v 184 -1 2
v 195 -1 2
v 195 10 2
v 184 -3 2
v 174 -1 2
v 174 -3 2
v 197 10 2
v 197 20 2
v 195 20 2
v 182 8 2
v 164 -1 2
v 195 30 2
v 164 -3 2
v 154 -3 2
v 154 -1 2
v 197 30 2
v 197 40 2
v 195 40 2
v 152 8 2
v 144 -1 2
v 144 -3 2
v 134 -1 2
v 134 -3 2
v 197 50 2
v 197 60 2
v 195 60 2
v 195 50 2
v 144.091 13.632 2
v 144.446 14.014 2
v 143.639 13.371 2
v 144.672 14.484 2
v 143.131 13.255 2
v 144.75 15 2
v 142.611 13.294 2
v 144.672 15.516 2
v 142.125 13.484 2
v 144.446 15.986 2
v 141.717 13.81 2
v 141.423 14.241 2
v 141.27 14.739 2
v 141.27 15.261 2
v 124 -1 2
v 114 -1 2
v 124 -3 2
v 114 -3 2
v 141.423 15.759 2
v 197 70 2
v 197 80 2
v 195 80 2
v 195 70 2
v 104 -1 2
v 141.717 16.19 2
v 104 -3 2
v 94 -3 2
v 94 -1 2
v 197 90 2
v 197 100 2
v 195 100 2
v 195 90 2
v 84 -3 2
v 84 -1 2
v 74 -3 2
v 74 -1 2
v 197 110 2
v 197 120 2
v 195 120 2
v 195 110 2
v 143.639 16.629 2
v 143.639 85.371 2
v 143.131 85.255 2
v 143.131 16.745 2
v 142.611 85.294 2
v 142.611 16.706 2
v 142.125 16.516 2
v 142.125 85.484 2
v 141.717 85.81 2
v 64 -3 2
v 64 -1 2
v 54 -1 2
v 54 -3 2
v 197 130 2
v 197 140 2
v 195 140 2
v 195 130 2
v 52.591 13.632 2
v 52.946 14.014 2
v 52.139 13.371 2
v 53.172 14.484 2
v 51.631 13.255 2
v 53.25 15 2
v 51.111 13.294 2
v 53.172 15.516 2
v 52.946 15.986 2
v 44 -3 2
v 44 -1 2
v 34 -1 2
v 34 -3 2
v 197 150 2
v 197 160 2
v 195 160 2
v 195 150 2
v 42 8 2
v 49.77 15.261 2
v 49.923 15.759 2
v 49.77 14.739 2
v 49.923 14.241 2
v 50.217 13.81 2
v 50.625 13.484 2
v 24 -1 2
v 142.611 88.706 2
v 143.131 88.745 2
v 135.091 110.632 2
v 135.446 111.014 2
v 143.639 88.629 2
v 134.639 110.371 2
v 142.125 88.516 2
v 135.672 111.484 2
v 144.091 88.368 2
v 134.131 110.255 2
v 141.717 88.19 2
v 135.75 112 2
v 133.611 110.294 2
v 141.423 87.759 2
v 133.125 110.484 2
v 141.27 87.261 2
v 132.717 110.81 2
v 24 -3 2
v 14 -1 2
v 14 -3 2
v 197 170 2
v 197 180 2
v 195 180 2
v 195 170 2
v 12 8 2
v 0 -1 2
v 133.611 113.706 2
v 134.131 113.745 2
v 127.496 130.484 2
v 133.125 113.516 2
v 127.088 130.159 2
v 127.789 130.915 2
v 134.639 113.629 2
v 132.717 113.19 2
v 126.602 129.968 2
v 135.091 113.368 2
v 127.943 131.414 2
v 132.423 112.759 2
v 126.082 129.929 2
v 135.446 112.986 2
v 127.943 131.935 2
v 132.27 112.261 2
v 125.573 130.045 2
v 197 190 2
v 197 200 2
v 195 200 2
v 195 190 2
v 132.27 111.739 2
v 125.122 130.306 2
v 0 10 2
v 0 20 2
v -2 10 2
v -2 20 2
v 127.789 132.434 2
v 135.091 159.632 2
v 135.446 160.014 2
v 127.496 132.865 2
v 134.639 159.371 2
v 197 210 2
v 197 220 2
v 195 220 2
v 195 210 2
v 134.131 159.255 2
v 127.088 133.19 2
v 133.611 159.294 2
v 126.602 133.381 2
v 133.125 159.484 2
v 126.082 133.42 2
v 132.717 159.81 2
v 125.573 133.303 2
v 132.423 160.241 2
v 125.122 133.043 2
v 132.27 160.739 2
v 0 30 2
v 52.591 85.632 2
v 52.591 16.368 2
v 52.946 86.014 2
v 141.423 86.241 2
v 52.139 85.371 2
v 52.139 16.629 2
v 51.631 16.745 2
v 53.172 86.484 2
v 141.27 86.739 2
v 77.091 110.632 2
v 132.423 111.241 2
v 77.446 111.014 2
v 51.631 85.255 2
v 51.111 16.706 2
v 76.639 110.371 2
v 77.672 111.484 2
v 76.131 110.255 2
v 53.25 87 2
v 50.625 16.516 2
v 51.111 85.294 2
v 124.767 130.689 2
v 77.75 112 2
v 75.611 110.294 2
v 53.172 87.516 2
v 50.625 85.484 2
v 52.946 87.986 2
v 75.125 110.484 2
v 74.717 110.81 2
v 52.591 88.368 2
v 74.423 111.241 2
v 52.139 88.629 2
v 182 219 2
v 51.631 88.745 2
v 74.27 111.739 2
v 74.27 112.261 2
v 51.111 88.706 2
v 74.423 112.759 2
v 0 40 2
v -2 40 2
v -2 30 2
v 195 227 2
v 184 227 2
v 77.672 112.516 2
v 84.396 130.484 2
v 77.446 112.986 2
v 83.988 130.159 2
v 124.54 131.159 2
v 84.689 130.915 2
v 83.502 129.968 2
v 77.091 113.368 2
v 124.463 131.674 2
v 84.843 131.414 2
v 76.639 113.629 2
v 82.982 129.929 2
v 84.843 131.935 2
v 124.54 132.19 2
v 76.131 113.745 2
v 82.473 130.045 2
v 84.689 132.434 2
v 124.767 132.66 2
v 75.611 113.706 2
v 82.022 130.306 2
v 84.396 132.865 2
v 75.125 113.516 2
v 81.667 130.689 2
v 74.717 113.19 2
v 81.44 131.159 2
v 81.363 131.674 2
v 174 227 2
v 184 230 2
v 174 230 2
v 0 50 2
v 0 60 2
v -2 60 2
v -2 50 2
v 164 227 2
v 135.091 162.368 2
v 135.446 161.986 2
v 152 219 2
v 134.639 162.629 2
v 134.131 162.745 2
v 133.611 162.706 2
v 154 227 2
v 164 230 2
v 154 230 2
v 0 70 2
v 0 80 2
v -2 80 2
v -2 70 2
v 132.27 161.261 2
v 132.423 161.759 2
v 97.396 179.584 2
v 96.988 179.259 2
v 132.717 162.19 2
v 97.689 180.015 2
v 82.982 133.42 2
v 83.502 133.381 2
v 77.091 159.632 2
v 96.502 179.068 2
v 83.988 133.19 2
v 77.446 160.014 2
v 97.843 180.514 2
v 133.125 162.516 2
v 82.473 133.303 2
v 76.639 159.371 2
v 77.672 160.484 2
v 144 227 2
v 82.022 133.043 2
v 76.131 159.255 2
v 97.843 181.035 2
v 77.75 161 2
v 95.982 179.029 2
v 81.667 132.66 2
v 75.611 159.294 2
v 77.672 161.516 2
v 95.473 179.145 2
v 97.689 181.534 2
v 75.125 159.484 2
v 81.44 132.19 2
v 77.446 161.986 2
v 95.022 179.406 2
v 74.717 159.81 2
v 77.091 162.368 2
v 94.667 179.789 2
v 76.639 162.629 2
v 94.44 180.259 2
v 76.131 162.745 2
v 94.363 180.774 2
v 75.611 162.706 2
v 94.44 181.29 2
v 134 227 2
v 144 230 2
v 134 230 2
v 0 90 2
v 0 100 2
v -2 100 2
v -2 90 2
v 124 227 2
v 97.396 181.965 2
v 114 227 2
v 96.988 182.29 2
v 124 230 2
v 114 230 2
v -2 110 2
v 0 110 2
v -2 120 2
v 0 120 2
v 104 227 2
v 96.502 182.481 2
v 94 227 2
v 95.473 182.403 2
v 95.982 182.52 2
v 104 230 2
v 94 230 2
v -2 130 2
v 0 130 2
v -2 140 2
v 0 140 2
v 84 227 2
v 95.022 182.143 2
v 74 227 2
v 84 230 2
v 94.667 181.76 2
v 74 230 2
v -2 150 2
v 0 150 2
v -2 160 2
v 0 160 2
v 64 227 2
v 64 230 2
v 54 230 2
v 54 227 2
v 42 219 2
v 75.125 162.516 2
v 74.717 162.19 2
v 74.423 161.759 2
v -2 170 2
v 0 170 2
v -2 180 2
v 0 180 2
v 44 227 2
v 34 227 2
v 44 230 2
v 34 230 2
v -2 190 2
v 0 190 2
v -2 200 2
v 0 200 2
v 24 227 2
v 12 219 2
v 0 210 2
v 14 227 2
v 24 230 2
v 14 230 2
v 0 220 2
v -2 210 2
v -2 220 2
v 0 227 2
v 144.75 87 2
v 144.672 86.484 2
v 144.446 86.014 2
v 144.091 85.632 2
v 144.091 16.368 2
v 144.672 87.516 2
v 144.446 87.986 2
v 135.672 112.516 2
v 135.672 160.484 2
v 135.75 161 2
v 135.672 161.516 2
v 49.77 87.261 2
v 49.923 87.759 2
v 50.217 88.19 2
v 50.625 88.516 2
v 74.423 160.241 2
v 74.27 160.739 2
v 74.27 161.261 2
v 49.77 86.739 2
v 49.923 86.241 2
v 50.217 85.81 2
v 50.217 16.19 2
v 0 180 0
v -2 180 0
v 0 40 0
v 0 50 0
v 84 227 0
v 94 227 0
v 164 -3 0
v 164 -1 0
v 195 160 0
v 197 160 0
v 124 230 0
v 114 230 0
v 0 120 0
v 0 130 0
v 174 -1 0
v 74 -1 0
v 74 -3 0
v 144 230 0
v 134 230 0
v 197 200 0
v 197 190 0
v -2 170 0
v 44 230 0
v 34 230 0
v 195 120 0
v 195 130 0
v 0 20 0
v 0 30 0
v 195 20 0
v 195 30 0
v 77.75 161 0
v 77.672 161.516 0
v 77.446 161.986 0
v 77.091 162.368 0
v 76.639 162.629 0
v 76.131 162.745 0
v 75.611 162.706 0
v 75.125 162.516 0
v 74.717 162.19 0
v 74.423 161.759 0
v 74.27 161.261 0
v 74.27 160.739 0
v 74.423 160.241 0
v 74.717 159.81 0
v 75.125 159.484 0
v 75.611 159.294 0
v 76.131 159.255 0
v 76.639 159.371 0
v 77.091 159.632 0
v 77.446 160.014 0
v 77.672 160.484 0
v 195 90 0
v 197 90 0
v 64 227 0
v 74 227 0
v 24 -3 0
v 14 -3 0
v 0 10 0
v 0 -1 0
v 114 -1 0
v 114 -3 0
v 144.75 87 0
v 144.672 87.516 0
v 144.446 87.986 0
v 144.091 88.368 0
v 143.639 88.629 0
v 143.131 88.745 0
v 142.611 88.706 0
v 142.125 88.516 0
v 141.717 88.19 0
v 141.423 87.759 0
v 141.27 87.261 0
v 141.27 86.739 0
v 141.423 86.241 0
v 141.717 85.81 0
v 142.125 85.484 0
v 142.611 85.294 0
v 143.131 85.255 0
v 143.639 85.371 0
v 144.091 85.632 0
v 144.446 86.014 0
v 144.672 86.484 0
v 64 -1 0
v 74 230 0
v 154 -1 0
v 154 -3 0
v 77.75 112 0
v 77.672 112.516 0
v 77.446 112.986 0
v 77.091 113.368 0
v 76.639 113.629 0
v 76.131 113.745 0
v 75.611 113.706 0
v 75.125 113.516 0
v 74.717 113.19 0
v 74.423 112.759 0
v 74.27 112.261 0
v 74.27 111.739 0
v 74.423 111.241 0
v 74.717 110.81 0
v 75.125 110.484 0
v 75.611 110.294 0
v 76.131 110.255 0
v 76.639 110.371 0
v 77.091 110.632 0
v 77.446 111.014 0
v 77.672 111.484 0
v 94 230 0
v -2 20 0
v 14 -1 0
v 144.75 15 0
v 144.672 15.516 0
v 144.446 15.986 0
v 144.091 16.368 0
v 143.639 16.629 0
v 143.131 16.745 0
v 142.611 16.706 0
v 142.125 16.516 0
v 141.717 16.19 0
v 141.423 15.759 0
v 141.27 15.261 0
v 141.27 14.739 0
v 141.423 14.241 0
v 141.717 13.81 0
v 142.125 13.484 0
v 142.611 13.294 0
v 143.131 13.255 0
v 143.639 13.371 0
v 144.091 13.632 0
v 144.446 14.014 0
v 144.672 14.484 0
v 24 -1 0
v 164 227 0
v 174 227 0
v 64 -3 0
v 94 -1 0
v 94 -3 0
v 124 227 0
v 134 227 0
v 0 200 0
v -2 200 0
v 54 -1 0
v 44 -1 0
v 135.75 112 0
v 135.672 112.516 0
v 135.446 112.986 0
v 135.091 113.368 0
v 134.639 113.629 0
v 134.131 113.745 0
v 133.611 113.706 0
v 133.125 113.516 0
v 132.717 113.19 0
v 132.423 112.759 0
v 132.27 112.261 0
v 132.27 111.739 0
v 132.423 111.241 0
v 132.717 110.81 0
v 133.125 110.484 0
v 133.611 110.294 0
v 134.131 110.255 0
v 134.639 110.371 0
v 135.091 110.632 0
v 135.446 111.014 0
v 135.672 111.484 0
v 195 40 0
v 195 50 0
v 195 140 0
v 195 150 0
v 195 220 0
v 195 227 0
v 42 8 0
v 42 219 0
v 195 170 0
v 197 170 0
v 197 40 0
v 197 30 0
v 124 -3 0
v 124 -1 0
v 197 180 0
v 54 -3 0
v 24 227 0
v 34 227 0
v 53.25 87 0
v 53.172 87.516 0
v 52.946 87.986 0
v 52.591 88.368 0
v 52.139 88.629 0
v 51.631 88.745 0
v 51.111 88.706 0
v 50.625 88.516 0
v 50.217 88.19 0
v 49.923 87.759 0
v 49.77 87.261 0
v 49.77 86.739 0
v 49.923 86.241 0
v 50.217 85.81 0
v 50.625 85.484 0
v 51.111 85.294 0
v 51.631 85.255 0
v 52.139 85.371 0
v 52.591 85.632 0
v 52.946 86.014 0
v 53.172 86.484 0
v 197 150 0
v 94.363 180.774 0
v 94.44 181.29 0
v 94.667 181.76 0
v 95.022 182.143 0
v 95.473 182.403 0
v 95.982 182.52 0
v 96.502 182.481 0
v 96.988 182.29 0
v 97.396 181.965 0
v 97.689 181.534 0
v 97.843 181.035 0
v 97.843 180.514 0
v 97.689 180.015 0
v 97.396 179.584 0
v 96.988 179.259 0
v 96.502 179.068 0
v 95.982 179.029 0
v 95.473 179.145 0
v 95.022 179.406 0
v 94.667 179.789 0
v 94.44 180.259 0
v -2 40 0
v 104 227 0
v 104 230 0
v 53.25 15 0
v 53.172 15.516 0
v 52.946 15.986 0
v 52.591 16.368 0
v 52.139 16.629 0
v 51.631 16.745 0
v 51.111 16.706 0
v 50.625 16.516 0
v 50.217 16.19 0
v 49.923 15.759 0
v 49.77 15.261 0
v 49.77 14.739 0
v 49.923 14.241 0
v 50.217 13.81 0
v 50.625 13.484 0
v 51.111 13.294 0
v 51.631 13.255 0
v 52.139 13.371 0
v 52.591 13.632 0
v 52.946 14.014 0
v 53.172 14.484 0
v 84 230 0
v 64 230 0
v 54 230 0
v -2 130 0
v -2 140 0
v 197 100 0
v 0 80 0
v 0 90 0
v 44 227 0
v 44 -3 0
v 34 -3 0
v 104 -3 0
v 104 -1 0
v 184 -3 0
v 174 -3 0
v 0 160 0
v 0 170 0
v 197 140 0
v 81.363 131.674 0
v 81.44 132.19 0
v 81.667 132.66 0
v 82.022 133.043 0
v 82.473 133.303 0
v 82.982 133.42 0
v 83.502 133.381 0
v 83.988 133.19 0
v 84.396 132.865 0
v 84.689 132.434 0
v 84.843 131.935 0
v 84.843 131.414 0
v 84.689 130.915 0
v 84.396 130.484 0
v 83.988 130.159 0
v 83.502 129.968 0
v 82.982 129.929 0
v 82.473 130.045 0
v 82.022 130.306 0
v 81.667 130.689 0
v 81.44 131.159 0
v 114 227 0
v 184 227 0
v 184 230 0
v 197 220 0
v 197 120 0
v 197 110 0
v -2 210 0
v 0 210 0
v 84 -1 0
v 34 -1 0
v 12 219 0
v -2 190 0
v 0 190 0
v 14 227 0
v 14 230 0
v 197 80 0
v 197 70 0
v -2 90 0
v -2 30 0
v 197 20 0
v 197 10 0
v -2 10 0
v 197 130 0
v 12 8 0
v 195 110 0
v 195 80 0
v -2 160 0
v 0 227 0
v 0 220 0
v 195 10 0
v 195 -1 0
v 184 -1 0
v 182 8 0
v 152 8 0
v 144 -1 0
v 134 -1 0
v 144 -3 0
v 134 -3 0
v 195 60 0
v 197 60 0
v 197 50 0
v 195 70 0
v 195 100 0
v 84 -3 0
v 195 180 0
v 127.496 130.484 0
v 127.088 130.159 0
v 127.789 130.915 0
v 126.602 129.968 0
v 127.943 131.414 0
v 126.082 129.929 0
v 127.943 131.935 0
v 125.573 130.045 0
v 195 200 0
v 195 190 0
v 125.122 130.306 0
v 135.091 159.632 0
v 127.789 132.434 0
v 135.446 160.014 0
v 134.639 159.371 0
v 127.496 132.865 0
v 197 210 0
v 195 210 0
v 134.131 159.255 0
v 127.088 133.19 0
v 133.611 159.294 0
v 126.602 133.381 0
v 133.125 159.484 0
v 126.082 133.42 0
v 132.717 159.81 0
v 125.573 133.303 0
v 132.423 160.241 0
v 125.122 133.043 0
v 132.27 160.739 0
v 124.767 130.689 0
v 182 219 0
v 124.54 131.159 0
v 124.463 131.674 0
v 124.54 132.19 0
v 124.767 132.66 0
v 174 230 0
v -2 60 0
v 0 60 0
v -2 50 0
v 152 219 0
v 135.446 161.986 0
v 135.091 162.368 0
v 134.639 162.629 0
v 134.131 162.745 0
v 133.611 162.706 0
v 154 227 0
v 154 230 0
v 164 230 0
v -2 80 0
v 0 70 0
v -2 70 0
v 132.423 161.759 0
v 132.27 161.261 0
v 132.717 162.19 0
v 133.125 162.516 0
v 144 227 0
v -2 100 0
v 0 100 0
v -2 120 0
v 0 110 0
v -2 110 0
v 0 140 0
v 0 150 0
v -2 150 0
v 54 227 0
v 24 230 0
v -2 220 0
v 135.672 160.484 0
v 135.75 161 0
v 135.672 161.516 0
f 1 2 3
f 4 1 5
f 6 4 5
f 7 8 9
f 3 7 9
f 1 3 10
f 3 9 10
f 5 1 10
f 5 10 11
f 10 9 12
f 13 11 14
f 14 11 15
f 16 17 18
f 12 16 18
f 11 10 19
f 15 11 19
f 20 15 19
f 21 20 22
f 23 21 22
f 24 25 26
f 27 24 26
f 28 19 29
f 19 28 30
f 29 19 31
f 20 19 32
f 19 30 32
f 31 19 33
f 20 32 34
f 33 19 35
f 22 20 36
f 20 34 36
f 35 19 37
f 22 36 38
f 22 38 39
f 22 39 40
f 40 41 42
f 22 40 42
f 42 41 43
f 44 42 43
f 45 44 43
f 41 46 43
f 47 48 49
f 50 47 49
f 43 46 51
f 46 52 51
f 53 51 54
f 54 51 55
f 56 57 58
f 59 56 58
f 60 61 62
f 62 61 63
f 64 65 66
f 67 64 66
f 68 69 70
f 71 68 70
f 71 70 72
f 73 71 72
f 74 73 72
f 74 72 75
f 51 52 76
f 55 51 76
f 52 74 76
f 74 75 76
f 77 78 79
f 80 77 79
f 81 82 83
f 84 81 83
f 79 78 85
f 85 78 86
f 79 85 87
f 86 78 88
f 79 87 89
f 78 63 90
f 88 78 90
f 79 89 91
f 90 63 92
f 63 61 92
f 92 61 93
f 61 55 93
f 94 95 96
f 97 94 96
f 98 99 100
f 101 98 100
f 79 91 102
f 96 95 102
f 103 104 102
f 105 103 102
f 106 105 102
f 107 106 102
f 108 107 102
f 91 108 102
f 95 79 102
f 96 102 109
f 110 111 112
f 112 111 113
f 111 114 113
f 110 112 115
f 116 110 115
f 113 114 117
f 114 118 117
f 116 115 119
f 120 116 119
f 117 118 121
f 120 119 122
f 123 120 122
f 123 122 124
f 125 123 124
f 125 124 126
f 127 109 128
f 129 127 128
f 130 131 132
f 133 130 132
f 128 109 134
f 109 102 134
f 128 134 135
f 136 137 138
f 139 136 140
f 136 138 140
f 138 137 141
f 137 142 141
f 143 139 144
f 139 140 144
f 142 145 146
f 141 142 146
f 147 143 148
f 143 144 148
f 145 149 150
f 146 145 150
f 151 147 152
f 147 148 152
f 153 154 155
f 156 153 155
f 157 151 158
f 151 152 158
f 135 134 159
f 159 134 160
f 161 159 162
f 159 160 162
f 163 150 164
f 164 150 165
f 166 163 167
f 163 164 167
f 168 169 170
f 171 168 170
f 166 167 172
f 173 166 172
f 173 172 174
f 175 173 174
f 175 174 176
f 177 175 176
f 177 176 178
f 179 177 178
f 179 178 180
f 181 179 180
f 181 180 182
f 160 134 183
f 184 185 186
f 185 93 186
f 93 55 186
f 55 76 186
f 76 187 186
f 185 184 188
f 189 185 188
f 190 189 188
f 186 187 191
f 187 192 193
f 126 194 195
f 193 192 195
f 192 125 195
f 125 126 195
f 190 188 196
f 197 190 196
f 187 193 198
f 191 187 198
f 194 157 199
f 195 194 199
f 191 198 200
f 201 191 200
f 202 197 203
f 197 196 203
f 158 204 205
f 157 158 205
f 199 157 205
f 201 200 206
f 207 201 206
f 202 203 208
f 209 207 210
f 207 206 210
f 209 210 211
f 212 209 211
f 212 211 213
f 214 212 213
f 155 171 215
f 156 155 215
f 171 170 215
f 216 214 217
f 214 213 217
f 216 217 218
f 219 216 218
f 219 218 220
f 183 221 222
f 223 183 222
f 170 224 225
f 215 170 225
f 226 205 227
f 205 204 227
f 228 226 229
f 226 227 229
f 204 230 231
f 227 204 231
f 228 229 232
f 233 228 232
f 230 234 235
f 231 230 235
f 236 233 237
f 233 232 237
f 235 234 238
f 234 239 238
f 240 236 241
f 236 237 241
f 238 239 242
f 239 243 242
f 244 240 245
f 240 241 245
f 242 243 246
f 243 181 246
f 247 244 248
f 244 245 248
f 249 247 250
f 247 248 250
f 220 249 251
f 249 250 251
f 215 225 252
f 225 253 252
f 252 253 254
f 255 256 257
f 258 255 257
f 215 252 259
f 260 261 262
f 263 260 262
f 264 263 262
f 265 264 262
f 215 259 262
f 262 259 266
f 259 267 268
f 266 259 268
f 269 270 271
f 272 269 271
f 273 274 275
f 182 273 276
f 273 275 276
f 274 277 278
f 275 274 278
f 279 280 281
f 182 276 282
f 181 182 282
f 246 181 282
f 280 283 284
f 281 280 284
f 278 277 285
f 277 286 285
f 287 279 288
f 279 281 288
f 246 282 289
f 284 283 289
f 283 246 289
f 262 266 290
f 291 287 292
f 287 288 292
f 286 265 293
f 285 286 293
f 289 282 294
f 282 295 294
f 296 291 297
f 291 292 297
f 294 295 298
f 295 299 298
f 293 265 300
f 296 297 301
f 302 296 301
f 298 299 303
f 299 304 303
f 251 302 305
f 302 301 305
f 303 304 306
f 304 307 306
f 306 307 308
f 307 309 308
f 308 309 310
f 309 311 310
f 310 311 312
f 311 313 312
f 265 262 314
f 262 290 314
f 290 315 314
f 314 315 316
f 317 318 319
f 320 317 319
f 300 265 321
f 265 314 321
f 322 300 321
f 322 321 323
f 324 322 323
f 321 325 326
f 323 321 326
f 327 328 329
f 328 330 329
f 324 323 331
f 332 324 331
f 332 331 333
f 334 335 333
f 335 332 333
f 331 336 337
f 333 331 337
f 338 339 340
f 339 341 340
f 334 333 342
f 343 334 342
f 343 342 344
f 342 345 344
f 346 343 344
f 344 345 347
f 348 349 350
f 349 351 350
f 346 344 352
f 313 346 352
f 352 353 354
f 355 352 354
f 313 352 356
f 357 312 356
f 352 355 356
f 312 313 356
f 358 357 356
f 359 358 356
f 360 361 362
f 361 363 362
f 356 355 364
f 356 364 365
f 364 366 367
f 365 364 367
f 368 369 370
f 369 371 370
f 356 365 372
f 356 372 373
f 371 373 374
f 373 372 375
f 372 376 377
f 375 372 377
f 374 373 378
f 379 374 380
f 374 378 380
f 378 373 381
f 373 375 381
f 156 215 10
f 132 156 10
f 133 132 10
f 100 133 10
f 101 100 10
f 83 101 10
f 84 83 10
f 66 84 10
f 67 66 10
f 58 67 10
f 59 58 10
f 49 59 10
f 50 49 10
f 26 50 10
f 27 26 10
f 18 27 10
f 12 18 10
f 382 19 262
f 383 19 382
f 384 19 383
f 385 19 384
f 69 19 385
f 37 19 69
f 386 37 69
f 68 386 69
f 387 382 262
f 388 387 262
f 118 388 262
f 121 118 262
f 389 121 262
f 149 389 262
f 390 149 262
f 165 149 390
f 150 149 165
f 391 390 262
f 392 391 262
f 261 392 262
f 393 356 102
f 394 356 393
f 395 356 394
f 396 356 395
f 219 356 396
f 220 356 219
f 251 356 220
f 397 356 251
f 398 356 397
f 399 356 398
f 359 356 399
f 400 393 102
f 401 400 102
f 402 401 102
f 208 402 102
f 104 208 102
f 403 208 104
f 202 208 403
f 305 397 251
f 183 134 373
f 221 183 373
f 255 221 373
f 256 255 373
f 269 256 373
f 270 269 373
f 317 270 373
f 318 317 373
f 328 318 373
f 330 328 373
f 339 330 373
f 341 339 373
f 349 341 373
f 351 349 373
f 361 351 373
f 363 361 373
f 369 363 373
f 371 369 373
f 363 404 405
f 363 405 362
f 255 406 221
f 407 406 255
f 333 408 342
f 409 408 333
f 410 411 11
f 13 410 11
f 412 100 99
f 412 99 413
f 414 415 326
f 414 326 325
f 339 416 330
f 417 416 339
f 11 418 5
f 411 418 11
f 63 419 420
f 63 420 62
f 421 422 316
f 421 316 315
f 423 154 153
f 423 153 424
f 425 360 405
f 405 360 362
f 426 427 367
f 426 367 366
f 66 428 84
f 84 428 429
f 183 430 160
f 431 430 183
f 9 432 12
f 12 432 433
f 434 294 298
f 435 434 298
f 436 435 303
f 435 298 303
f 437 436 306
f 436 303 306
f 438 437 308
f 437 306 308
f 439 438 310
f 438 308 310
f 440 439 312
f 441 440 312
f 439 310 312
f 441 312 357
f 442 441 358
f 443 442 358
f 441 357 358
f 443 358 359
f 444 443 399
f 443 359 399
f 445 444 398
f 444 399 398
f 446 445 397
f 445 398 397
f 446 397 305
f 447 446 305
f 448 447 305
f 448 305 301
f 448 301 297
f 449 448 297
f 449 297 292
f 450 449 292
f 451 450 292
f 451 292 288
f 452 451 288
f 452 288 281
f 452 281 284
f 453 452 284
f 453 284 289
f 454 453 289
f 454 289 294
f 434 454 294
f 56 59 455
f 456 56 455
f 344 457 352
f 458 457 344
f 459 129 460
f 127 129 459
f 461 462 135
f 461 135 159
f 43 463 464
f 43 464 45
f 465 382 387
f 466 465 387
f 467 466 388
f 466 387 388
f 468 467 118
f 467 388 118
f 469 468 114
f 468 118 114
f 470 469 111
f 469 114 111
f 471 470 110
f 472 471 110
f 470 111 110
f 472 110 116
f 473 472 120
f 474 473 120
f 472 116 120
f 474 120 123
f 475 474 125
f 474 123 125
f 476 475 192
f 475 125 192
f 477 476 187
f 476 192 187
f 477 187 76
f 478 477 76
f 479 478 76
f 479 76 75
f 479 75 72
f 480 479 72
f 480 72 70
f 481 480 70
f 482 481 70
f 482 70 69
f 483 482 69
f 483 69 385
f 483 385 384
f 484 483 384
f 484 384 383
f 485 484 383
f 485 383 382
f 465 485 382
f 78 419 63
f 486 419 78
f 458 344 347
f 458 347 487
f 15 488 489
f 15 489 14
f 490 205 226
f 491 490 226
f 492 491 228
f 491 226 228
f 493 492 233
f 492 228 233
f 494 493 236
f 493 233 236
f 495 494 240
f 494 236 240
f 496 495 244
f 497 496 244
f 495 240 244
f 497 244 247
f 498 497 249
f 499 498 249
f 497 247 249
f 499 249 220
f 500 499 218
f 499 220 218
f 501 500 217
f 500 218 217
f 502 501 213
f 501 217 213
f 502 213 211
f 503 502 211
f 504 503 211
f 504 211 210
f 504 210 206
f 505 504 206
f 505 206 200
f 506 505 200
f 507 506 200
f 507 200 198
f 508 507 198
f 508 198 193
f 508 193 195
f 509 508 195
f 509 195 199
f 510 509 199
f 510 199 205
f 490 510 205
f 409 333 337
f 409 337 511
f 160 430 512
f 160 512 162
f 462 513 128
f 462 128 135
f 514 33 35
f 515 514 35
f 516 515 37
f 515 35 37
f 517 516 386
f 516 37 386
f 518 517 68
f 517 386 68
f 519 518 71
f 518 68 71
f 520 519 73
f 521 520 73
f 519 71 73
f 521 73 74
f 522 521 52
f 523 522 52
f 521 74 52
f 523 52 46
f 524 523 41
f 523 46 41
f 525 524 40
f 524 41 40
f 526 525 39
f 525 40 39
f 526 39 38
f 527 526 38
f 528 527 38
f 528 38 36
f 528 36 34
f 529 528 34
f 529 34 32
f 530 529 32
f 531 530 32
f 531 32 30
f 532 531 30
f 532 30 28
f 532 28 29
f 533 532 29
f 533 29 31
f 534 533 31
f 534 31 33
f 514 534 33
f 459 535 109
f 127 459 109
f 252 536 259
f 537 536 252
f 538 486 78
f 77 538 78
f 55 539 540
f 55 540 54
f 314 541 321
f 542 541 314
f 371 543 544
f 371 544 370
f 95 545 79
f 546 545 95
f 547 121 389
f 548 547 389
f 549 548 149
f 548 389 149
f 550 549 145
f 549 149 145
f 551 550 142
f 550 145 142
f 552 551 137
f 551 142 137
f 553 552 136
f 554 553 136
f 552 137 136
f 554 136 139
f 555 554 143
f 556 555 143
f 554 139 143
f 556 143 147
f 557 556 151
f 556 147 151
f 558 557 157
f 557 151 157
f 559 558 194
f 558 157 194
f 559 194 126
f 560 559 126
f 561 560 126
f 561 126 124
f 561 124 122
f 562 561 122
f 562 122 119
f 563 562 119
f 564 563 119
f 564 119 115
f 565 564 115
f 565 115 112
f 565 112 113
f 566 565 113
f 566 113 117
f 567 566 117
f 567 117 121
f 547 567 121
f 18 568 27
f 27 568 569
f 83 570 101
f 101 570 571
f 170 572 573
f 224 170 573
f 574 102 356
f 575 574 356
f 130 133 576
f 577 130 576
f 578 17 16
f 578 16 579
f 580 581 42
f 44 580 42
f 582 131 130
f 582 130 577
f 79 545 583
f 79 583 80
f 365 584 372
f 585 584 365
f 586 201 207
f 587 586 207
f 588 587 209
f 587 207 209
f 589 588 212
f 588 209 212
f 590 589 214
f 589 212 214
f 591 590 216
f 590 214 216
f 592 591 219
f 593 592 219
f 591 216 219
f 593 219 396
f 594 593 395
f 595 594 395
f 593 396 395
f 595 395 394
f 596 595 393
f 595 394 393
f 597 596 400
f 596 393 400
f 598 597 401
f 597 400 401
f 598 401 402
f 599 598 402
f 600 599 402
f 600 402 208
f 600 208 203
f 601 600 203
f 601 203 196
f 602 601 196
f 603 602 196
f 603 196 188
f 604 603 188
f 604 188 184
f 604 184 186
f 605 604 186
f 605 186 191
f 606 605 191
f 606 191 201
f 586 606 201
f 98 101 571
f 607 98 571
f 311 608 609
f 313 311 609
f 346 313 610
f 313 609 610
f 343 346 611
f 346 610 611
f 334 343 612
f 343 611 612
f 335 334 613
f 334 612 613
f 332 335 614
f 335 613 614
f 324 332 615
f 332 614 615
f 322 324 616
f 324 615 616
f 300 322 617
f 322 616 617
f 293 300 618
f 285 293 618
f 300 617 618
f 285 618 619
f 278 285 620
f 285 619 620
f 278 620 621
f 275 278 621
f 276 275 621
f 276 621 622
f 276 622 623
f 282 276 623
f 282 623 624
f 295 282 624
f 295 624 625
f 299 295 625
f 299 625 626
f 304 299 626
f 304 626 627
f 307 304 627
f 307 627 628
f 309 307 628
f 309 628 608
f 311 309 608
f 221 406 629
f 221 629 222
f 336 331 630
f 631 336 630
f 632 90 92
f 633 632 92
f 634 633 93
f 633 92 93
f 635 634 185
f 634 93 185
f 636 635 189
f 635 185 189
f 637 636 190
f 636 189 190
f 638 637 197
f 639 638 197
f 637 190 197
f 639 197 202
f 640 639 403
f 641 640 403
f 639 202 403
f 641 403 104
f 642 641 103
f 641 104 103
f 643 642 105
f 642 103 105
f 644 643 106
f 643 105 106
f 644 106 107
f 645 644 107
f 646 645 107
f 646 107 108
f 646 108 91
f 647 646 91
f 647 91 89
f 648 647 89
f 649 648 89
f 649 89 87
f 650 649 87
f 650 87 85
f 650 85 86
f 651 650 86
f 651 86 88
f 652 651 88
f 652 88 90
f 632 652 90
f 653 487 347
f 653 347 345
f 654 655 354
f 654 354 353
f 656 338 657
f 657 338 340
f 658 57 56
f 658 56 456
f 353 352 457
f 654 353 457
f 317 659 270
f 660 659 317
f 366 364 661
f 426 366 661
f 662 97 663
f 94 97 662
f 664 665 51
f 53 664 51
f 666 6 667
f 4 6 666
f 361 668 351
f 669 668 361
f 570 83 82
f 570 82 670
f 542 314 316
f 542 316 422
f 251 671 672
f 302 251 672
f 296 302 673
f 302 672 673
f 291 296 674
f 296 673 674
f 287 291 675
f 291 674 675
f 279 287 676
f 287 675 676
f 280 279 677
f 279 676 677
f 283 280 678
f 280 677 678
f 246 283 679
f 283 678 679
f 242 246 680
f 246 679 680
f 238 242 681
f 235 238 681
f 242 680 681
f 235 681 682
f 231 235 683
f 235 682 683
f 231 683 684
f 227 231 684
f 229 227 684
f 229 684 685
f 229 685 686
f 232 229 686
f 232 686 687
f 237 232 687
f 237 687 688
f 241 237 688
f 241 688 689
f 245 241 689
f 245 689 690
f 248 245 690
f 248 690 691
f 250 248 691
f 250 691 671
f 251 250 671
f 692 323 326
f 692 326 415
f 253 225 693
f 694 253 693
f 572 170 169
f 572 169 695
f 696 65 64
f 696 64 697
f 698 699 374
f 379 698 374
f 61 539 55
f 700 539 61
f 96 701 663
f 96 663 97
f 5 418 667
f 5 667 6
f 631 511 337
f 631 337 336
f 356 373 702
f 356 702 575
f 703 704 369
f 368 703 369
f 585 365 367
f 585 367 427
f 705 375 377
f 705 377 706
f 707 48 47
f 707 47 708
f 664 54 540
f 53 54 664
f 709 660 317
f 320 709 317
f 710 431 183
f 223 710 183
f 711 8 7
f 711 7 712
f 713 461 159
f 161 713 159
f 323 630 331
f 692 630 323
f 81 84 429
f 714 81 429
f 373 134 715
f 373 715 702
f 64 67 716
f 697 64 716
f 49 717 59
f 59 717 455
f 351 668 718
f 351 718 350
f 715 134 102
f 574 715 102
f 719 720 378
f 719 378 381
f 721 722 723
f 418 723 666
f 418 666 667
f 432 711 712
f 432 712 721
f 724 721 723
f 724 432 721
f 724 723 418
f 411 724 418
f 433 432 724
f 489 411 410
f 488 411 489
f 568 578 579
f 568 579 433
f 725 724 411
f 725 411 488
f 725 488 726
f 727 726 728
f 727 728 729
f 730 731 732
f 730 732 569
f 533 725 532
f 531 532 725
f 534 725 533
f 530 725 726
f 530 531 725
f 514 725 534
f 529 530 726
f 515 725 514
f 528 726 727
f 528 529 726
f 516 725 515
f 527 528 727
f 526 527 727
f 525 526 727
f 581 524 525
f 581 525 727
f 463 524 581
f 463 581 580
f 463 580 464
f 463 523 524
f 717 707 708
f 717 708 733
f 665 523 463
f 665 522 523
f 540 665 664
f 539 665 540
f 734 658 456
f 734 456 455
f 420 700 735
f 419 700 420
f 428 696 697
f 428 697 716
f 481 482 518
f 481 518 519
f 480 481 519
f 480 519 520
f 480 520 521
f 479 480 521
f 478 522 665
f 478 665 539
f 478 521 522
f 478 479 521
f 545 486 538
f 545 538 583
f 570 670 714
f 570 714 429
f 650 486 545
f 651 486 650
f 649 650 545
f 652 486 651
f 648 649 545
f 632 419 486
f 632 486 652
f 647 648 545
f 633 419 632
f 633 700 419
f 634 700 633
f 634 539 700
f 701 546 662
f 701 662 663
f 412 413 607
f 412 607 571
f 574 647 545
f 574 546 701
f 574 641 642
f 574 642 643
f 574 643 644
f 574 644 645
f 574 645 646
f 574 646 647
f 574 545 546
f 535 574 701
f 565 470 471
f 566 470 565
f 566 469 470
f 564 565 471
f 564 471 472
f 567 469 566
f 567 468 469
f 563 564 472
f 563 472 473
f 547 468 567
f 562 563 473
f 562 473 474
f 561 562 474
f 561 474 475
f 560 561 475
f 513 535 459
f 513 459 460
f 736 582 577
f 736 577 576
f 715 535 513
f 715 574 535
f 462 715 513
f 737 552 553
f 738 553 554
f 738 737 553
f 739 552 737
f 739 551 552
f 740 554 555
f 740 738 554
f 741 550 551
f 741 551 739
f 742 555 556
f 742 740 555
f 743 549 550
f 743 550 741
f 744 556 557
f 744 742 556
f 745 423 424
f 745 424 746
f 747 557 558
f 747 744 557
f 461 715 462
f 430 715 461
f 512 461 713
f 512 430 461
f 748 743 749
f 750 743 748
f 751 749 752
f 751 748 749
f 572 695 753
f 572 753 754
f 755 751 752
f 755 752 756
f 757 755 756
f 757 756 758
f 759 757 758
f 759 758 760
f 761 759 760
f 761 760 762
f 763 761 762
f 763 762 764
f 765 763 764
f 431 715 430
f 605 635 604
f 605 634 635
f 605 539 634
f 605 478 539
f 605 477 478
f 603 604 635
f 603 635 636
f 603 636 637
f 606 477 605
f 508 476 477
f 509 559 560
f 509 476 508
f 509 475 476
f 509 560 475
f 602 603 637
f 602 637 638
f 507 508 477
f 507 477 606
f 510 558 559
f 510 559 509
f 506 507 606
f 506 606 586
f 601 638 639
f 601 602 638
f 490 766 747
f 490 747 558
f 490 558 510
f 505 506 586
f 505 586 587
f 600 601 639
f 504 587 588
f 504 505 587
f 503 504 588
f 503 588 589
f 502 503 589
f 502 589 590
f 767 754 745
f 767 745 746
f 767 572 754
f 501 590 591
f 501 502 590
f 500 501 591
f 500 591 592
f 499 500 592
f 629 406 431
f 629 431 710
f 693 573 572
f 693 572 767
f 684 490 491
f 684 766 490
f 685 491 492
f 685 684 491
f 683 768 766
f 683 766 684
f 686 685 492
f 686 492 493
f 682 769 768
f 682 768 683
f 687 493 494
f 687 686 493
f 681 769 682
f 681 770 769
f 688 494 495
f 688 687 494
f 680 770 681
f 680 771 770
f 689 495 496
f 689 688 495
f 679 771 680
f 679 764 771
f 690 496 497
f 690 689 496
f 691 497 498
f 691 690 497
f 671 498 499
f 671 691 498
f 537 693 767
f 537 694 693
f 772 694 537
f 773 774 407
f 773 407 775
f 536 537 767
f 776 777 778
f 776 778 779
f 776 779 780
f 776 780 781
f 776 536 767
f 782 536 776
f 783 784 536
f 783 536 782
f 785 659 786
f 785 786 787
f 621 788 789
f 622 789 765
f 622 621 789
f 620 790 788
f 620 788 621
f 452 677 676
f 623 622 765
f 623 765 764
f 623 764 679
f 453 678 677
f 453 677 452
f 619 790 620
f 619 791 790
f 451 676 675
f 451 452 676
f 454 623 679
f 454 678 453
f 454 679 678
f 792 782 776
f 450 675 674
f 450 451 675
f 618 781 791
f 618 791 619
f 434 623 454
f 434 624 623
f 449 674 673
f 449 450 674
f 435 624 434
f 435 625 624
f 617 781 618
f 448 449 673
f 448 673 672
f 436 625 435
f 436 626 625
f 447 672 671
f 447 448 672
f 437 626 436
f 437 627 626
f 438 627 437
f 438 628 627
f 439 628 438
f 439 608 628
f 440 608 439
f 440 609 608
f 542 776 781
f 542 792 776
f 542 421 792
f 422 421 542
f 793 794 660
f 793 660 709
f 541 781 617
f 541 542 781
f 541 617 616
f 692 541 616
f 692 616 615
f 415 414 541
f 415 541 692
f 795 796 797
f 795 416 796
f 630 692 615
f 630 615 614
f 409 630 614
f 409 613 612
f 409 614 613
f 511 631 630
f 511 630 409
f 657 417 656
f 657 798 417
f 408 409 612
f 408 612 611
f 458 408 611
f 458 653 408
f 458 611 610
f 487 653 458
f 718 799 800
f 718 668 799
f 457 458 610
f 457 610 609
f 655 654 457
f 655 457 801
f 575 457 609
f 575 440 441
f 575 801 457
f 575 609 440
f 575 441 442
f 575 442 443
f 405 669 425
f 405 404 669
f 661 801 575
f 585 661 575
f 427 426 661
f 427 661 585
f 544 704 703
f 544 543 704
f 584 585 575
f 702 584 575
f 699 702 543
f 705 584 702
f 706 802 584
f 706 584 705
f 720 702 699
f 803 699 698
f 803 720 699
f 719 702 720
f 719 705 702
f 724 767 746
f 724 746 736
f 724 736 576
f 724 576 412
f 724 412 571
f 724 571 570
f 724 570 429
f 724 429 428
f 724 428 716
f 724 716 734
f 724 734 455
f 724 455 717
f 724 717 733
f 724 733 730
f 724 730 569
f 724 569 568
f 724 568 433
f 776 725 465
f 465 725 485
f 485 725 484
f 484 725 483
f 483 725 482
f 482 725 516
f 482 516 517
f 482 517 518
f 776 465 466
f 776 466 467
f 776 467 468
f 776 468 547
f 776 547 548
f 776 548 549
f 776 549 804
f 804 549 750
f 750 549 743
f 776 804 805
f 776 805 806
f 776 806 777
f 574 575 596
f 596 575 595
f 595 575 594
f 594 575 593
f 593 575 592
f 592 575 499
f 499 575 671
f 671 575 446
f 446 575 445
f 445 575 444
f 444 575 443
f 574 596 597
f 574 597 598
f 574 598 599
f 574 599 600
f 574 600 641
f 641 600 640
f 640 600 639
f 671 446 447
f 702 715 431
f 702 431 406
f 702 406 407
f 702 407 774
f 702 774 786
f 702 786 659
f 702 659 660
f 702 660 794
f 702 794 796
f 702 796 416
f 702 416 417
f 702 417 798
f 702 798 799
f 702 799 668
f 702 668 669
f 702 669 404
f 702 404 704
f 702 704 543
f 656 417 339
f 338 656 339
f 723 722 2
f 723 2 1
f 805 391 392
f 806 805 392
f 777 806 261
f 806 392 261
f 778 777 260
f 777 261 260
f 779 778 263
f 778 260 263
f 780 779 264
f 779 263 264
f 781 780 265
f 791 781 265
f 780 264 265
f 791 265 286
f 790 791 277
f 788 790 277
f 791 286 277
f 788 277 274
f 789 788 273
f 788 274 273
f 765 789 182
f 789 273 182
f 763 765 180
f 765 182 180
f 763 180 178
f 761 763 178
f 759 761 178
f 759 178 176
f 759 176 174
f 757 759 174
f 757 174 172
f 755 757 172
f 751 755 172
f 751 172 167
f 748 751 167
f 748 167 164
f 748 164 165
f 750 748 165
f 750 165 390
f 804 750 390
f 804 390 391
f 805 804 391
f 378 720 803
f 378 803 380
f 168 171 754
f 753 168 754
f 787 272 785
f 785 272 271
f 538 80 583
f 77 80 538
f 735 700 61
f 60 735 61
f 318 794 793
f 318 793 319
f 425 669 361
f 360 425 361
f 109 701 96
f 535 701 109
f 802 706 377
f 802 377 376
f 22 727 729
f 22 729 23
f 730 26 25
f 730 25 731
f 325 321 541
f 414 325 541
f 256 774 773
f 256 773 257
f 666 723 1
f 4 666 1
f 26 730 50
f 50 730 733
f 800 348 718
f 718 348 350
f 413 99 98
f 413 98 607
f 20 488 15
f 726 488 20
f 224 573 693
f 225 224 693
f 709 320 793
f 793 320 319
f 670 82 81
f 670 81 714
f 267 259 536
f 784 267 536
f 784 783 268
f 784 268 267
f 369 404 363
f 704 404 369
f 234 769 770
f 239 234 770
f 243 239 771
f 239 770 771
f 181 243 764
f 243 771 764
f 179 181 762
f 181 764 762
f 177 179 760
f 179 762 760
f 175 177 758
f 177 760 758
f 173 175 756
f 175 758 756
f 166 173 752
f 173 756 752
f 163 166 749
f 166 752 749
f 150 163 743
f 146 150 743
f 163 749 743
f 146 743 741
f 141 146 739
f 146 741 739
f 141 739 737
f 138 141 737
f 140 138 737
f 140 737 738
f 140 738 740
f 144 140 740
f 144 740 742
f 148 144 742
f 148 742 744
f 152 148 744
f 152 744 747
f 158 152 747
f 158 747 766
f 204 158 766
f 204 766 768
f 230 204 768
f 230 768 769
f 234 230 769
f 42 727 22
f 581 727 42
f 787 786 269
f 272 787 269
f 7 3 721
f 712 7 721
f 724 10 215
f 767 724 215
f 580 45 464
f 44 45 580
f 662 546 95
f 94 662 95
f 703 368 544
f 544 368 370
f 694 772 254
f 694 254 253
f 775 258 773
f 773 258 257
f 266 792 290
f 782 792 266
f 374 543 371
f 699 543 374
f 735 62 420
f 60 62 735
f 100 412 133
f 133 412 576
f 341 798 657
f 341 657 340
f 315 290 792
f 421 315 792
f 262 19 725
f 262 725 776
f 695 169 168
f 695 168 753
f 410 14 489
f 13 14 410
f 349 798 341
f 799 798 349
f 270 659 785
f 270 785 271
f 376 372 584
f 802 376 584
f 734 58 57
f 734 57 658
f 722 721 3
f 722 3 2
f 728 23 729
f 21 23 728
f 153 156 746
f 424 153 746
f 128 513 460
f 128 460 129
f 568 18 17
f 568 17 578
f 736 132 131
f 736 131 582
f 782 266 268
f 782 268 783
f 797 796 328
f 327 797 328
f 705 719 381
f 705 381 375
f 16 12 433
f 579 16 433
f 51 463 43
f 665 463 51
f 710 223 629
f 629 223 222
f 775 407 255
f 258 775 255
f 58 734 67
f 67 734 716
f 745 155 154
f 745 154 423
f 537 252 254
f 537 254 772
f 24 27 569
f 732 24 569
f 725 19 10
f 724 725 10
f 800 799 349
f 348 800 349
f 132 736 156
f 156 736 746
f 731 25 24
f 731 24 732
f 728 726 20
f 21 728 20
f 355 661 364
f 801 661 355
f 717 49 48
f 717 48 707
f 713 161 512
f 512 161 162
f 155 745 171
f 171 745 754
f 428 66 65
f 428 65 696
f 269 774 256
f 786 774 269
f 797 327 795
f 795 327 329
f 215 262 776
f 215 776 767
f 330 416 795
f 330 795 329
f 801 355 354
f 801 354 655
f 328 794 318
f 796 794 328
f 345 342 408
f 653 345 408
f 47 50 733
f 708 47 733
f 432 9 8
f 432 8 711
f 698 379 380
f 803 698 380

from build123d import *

# Parameters (mm, degrees)
SKETCH1_W               = 194
SKETCH1_H               = 227
BOSS_EXTRUDE1_DEPTH     = 2
SKETCH2_W               = 2
SKETCH2_H               = 10
BOSS_EXTRUDE2_DEPTH     = 3
LPATTERN1_COUNT         = 11
LPATTERN1_PITCH         = 20
SKETCH4_W               = 2
SKETCH4_H               = 10
BOSS_EXTRUDE3_DEPTH     = 3
LPATTERN2_COUNT         = 11
LPATTERN2_PITCH         = 20
SKETCH5_W               = 10
SKETCH5_H               = 2
BOSS_EXTRUDE4_DEPTH     = 3
LPATTERN3_COUNT         = 9
LPATTERN3_PITCH         = 20
SKETCH6_W               = 10
SKETCH6_H               = 2
BOSS_EXTRUDE5_DEPTH     = 3
LPATTERN4_COUNT         = 9
LPATTERN4_PITCH         = 20
SKETCH7_W               = 30
SKETCH7_H               = 211
CUT_EXTRUDE1_DEPTH      = 3
SKETCH8_R               = 1.75
SKETCH8_W               = 30
SKETCH8_H               = 211
CUT_EXTRUDE2_DEPTH      = 3
ENL_V_START             = -2
ESQUISSE1_W             = 1
ESQUISSE1_H             = 231.630862985
ENL_V_MAT_EXTRU_1_DEPTH = 2
ESQUISSE2_W             = 1
ESQUISSE2_H             = 7
ESQUISSE2_H_2           = 10
ESQUISSE2_W_2           = 10
ESQUISSE2_H_3           = 1
ESQUISSE2_W_3           = 14
BOSS_EXTRU_1_DEPTH      = 2
ESQUISSE3_R             = 1.75
ENL_V_MAT_EXTRU_2_DEPTH = 3


with BuildPart() as part:
    # Sketch1 → Boss-Extrude1 (new body)
    with BuildSketch(Plane.XY):
        with Locations((97, 113.5)):
            Rectangle(SKETCH1_W, SKETCH1_H)
    extrude(amount=BOSS_EXTRUDE1_DEPTH)

    # Sketch2 → Boss-Extrude2 (add)
    with BuildSketch(Plane(origin=(194, 0, 0), x_dir=(0, 0, -1), z_dir=(1, 0, 0))):
        with Locations((-1, 15)):
            Rectangle(SKETCH2_W, SKETCH2_H)
    boss_extrude2 = extrude(amount=BOSS_EXTRUDE2_DEPTH)

    # LPattern1: Boss-Extrude2 ×11
    with Locations(*[(0, i * LPATTERN1_PITCH, 0) for i in range(1, LPATTERN1_COUNT)]):
        add(boss_extrude2)

    # Sketch4 → Boss-Extrude3 (add)
    with BuildSketch(Plane.ZY):
        with Locations((1, 15)):
            Rectangle(SKETCH4_W, SKETCH4_H)
    boss_extrude3 = extrude(amount=BOSS_EXTRUDE3_DEPTH)

    # LPattern2: Boss-Extrude3 ×11
    with Locations(*[(0, i * LPATTERN2_PITCH, 0) for i in range(1, LPATTERN2_COUNT)]):
        add(boss_extrude3)

    # Sketch5 → Boss-Extrude4 (add)
    with BuildSketch(Plane.XZ):
        with Locations((179, 1)):
            Rectangle(SKETCH5_W, SKETCH5_H)
    boss_extrude4 = extrude(amount=BOSS_EXTRUDE4_DEPTH)

    # LPattern3: Boss-Extrude4 ×9
    with Locations(*[(-i * LPATTERN3_PITCH, 0, 0) for i in range(1, LPATTERN3_COUNT)]):
        add(boss_extrude4)

    # Sketch6 → Boss-Extrude5 (add)
    with BuildSketch(Plane(origin=(0, 227, 0), x_dir=(1, 0, 0), z_dir=(0, 1, 0))):
        with Locations((179, -1)):
            Rectangle(SKETCH6_W, SKETCH6_H)
    boss_extrude5 = extrude(amount=BOSS_EXTRUDE5_DEPTH)

    # LPattern4: Boss-Extrude5 ×9
    with Locations(*[(-i * LPATTERN4_PITCH, 0, 0) for i in range(1, LPATTERN4_COUNT)]):
        add(boss_extrude5)

    # Sketch7 → Cut-Extrude1 (cut, through all)
    with BuildSketch(Plane.XY.offset(2)):
        with Locations((27, 113.5)):
            Rectangle(SKETCH7_W, SKETCH7_H)
    extrude(amount=-CUT_EXTRUDE1_DEPTH, mode=Mode.SUBTRACT)

    # Sketch8 → Cut-Extrude2 (cut, through all)
    with BuildSketch(Plane.XY.offset(2)):
        with Locations((143, 15)):
            Circle(SKETCH8_R)
        with Locations((51.5, 15)):
            Circle(SKETCH8_R)
        with Locations((143, 87)):
            Circle(SKETCH8_R)
        with Locations((51.5, 87)):
            Circle(SKETCH8_R)
        with Locations((134, 112)):
            Circle(SKETCH8_R)
        with Locations((76, 112)):
            Circle(SKETCH8_R)
        with Locations((134, 161)):
            Circle(SKETCH8_R)
        with Locations((76, 161)):
            Circle(SKETCH8_R)
        with Locations((167, 113.5)):
            Rectangle(SKETCH8_W, SKETCH8_H)
    extrude(amount=-CUT_EXTRUDE2_DEPTH, mode=Mode.SUBTRACT)

    # Esquisse1 → Enlèv. mat.-Extru.1 (cut)
    with BuildSketch(Plane(origin=(0, 0, 0), x_dir=(-1, 0, 0), z_dir=(0, 0, -1)).offset(ENL_V_START)):
        with Locations((2.5, 104.184568508)):
            Rectangle(ESQUISSE1_W, ESQUISSE1_H)
    extrude(amount=ENL_V_MAT_EXTRU_1_DEPTH, mode=Mode.SUBTRACT)

    # Esquisse2 → Boss.-Extru.1 (add)
    with BuildSketch(Plane(origin=(0, 0, 0), x_dir=(-1, 0, 0), z_dir=(0, 0, -1))):
        with Locations((-194.5, 223.5)):
            Rectangle(ESQUISSE2_W, ESQUISSE2_H)
        with Locations((-194.5, 205)):
            Rectangle(ESQUISSE2_W, ESQUISSE2_H_2)
        with Locations((-194.5, 185)):
            Rectangle(ESQUISSE2_W, ESQUISSE2_H_2)
        with Locations((-194.5, 165)):
            Rectangle(ESQUISSE2_W, ESQUISSE2_H_2)
        with Locations((-194.5, 145)):
            Rectangle(ESQUISSE2_W, ESQUISSE2_H_2)
        with Locations((-194.5, 125)):
            Rectangle(ESQUISSE2_W, ESQUISSE2_H_2)
        with Locations((-194.5, 105)):
            Rectangle(ESQUISSE2_W, ESQUISSE2_H_2)
        with Locations((-194.5, 85)):
            Rectangle(ESQUISSE2_W, ESQUISSE2_H_2)
        with Locations((-194.5, 65)):
            Rectangle(ESQUISSE2_W, ESQUISSE2_H_2)
        with Locations((-194.5, 45)):
            Rectangle(ESQUISSE2_W, ESQUISSE2_H_2)
        with Locations((-194.5, 25)):
            Rectangle(ESQUISSE2_W, ESQUISSE2_H_2)
        Polygon((-194, 0), (-194, 10), (-195, 10), (-195, -1), (-184, -1), (-184, 0), align=None)
        with Locations((-169, -0.5)):
            Rectangle(ESQUISSE2_W_2, ESQUISSE2_H_3)
        with Locations((-149, -0.5)):
            Rectangle(ESQUISSE2_W_2, ESQUISSE2_H_3)
        with Locations((-129, -0.5)):
            Rectangle(ESQUISSE2_W_2, ESQUISSE2_H_3)
        with Locations((-109, -0.5)):
            Rectangle(ESQUISSE2_W_2, ESQUISSE2_H_3)
        with Locations((-89, -0.5)):
            Rectangle(ESQUISSE2_W_2, ESQUISSE2_H_3)
        with Locations((-69, -0.5)):
            Rectangle(ESQUISSE2_W_2, ESQUISSE2_H_3)
        with Locations((-49, -0.5)):
            Rectangle(ESQUISSE2_W_2, ESQUISSE2_H_3)
        with Locations((-29, -0.5)):
            Rectangle(ESQUISSE2_W_2, ESQUISSE2_H_3)
        with Locations((-7, -0.5)):
            Rectangle(ESQUISSE2_W_3, ESQUISSE2_H_3)
    extrude(amount=-BOSS_EXTRU_1_DEPTH)

    # Esquisse3 → Enlèv. mat.-Extru.2 (cut, through all)
    with BuildSketch(Plane(origin=(0, 0, 0), x_dir=(-1, 0, 0), z_dir=(0, 0, -1))):
        with Locations((-96.112690171, 180.774445285)):
            Circle(ESQUISSE3_R)
        with Locations((-126.212690171, 131.674445285)):
            Circle(ESQUISSE3_R)
        with Locations((-83.112690171, 131.674445285)):
            Circle(ESQUISSE3_R)
    extrude(amount=-ENL_V_MAT_EXTRU_2_DEPTH, mode=Mode.SUBTRACT)


solid = part.part
